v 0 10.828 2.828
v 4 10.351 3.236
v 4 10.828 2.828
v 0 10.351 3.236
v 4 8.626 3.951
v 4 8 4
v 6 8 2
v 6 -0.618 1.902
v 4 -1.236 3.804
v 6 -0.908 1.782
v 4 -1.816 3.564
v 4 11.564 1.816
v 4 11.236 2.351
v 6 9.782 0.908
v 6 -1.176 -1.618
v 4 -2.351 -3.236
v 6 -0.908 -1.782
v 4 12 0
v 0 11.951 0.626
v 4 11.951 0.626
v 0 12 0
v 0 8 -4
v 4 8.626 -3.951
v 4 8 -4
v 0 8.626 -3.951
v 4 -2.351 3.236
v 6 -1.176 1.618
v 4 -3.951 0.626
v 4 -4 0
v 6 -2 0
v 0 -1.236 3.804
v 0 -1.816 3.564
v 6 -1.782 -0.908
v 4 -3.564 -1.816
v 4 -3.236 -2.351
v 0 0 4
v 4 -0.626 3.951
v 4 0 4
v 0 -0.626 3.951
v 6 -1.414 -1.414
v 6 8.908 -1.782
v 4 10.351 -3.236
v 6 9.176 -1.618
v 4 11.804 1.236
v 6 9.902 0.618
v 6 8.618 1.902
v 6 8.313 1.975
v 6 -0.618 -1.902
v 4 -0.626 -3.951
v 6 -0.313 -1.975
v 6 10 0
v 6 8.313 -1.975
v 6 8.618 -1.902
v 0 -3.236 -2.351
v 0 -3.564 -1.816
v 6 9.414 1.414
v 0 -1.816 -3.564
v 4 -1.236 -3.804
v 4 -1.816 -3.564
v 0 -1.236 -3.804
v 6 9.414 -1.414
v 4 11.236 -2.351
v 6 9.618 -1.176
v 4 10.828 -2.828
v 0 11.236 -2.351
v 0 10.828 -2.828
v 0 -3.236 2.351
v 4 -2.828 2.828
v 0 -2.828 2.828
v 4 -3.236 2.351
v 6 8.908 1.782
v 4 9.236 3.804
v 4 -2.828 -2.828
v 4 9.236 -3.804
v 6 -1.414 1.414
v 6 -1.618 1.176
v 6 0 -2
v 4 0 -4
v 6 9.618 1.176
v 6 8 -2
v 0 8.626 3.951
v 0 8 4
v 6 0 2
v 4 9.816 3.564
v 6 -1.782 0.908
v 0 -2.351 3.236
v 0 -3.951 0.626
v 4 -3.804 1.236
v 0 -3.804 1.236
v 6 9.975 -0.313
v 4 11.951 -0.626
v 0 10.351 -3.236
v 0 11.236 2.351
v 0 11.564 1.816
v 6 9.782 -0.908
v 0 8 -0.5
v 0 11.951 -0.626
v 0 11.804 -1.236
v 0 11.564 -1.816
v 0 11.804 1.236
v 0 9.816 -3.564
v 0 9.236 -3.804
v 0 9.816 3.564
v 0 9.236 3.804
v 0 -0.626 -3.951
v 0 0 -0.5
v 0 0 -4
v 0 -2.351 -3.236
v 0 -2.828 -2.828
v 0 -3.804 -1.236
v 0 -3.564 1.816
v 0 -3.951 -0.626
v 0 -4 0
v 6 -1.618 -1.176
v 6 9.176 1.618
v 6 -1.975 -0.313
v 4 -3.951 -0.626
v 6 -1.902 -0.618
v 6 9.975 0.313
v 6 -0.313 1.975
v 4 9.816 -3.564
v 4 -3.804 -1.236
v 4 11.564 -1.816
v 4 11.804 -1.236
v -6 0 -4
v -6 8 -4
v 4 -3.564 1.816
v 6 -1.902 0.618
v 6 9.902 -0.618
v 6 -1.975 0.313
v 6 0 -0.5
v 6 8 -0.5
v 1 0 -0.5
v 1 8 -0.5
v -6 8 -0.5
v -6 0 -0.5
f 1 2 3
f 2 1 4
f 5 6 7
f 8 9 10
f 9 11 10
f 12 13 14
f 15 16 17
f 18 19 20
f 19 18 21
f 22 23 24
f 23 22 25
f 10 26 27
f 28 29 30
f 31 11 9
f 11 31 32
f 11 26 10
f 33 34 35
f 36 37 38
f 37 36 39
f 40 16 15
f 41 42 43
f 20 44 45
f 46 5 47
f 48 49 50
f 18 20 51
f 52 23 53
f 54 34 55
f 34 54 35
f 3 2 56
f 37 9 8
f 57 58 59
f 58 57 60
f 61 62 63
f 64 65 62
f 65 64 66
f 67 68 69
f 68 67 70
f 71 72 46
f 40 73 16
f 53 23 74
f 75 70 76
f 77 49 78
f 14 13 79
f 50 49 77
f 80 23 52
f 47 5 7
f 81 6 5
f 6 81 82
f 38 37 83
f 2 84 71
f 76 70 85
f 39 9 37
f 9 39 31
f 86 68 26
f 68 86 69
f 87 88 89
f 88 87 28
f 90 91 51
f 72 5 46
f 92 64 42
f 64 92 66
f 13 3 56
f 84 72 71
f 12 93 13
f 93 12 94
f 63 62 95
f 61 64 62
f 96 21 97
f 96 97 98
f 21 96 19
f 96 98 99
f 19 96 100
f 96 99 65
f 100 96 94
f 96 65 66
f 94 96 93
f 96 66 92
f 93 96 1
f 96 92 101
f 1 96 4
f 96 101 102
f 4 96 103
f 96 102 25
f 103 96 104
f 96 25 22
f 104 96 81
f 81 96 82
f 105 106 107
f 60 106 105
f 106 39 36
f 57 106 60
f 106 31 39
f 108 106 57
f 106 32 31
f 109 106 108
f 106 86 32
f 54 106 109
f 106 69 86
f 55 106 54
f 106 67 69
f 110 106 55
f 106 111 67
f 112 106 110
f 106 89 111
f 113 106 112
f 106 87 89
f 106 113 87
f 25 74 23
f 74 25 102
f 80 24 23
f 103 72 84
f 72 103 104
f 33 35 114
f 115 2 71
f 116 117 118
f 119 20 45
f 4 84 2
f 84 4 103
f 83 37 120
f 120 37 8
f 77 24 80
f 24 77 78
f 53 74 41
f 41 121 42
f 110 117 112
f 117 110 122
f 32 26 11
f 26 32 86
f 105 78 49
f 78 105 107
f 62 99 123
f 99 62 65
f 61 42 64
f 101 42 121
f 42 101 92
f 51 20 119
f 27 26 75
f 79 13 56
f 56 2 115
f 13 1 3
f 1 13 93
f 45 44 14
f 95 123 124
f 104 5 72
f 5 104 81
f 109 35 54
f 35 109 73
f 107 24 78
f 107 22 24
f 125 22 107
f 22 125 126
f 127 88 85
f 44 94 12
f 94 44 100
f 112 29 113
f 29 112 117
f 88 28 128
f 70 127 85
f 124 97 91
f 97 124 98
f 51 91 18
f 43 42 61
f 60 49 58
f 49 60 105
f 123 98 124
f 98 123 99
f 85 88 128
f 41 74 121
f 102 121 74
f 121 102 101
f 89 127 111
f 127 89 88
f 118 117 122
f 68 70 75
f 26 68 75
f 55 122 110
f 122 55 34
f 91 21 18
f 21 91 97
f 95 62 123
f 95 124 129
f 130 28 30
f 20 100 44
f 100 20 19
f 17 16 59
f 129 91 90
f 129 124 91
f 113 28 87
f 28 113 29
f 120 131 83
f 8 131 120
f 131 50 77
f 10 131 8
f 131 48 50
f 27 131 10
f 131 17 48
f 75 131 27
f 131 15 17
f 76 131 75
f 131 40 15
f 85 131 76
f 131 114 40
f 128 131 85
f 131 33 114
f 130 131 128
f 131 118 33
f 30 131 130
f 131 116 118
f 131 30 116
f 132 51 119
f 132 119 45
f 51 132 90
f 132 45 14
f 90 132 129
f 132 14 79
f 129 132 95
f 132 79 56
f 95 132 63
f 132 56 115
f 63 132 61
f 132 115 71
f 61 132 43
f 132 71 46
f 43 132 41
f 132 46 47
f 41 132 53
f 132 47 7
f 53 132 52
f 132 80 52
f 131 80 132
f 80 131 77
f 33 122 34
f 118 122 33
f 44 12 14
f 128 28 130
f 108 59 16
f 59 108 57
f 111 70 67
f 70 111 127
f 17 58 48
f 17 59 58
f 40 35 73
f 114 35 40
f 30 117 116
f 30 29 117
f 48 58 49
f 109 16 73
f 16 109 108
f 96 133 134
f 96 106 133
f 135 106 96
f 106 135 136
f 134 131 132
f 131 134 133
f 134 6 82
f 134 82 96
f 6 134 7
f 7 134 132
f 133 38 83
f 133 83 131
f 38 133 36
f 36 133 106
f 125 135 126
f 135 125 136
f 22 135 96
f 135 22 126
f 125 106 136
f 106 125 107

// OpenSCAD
$fn=40;
//translate([0,0,22])lid();
//projection()lid();
//box();

difference(){
rotate([0,90,0])hull(){cylinder(d=8,h=4);translate([0,8,0])cylinder(d=8,h=4);translate([0,0,4])cylinder(d=4,h=2);translate([0,8,4])cylinder(d=4,h=2);};

translate([0,0,-0.5])cube([12,8,5]);
}
translate([-6,0,-4])cube([7,8,3.5]);


module lid(){
                hull(){
        translate([74,0,17])cylinder(d=8,h=2);
        translate([74,34,17])cylinder(d=8,h=2);
        translate([0,34,17])cylinder(d=8,h=2);
        translate([0,0,17])cylinder(d=8,h=2);
    }
}

module bracket(){
difference(){
    hull(){
        translate([-2,6,0])cylinder(d=2,h=5);
        translate([40,6,0])cylinder(d=2,h=5);
        translate([36,0,0])cylinder(d=4,h=5);
        translate([2,0,0])cylinder(d=4,h=5);
    }
    hull(){
        translate([4,3,-0.01])cylinder(d=4,h=55);
        translate([34,3,-0.010])cylinder(d=4,h=55);
    }
}}
        


module box(){
    translate([-1,-2,-6])rotate([90,0,90])bracket();
translate([70,-2,-6])rotate([90,0,90])bracket();

difference(){
    union(){hull(){
        translate([74,0,0])cylinder(d=10,h=19);
        translate([74,34,0])cylinder(d=10,h=19);
        translate([0,34,0])cylinder(d=10,h=19);
        translate([0,0,0])cylinder(d=10,h=19);
         translate([-9,24,13])rotate([0,90,0])hull(){cylinder(d=7.5,h=30);translate([0,4,0])cylinder(d=7.5,h=30);};
         translate([29.7,30,14.3])rotate([-90,0,0])cylinder(d=7,h=11);
 
         }
           translate([78,22,15])rotate([0,90,0])hull(){cylinder(d=8,h=6);translate([0,8,0])cylinder(d=8,h=6);};
         
     }
        hull(){
        translate([74,0,2])cylinder(d=6,h=18);
        translate([74,34,2])cylinder(d=6,h=18);
        translate([0,34,2])cylinder(d=6,h=18);
        translate([0,0,2])cylinder(d=6,h=18);
    }
            hull(){
        translate([74,0,17])cylinder(d=8,h=3);
        translate([74,34,17])cylinder(d=8,h=3);
        translate([0,34,17])cylinder(d=8,h=3);
        translate([0,0,17])cylinder(d=8,h=3);
    }
    
    translate([-12,24,13])rotate([0,90,0])hull(){cylinder(d=7.5,h=30);translate([0,4,0])cylinder(d=7.5,h=30);};
    
    translate([29.7,30,14.3])rotate([-90,0,0])cylinder(d=7,h=20);
    
    translate([70,22,14.5])cube([20,8,5]);
}


translate([14.5,17,-3])difference(){
    cylinder(d1=20,d2=24,h=3);
    cylinder(d1=16,d2=13,h=3);
}

translate([14.5+45,17,-3])difference(){
    cylinder(d1=20,d2=24,h=3);
    cylinder(d1=16,d2=13,h=3);
}
}
